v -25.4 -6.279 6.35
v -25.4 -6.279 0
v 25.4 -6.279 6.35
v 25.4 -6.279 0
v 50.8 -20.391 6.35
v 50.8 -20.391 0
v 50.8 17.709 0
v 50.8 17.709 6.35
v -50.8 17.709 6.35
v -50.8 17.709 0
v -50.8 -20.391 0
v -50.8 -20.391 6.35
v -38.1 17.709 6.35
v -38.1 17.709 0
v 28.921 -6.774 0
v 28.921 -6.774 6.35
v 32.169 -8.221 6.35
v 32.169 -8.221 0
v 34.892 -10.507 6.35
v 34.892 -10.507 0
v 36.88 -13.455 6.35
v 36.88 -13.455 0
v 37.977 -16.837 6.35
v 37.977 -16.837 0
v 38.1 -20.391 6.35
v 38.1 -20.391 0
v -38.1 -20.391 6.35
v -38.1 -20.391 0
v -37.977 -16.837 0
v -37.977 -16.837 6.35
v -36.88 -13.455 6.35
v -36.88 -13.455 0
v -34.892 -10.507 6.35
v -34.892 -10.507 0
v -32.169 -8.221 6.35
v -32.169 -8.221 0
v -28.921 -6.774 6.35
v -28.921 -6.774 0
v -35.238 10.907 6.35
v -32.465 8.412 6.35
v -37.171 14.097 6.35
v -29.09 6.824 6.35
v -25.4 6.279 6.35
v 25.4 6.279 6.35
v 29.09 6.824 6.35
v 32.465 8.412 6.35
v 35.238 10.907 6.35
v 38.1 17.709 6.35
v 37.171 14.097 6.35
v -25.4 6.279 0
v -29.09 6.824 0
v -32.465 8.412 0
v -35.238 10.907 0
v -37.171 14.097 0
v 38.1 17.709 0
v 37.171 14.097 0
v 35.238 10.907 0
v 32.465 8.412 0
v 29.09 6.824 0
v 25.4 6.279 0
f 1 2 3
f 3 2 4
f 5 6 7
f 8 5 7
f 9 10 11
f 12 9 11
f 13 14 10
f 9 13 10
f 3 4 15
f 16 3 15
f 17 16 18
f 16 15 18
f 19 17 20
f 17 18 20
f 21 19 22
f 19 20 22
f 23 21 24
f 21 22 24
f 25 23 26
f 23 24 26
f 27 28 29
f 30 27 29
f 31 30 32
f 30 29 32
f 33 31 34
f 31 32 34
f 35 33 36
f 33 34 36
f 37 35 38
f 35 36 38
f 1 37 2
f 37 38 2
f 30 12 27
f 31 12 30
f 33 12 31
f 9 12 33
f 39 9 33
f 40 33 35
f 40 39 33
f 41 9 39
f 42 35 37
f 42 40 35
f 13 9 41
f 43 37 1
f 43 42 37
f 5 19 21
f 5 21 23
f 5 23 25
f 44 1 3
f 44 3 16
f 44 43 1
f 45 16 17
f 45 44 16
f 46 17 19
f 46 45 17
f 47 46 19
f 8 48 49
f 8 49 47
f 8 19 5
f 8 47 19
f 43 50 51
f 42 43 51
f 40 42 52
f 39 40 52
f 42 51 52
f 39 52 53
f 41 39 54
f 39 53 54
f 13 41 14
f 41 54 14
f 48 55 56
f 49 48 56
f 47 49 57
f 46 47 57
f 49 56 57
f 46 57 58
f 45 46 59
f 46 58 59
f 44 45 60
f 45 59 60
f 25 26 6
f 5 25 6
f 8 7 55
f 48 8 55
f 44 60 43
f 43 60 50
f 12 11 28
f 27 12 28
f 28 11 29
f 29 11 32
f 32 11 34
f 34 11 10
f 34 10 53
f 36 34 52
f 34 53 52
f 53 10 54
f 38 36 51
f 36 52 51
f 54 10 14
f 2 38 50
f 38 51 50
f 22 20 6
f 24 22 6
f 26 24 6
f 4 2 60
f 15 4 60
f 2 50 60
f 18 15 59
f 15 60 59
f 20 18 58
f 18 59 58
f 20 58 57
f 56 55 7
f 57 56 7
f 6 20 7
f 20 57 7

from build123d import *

# Parameters (mm, degrees)
F1_DEPTH = 6.35


with BuildPart() as f1:
    # F0 (on Top) → F1 (new body)
    with BuildSketch(Plane.XY):
        with BuildLine():
            Line((0, -6.279444), (0, 0))
            Line((0, 0), (0, 6.279444))
            Line((0, 6.279444), (-25.4, 6.279444))
            ThreePointArc((-25.4, 6.279444), (-33.943051, 9.557721), (-38.1, 17.709444))
            Line((-38.1, 17.709444), (-50.8, 17.709444))
            Line((-50.8, 17.709444), (-50.8, -20.390556))
            Line((-50.8, -20.390556), (-38.1, -20.390556))
            ThreePointArc((-38.1, -20.390556), (-34.892279, -10.506949), (-25.4, -6.279444))
            Line((-25.4, -6.279444), (0, -6.279444))
        make_face()
        with BuildLine():
            Line((0, 6.279444), (0, 0))
            Line((0, 0), (0, -6.279444))
            Line((0, -6.279444), (25.4, -6.279444))
            ThreePointArc((25.4, -6.279444), (34.892279, -10.506949), (38.1, -20.390556))
            Line((38.1, -20.390556), (50.8, -20.390556))
            Line((50.8, -20.390556), (50.8, 17.709444))
            Line((50.8, 17.709444), (38.1, 17.709444))
            ThreePointArc((38.1, 17.709444), (33.943051, 9.557721), (25.4, 6.279444))
            Line((25.4, 6.279444), (0, 6.279444))
        make_face()
    extrude(amount=F1_DEPTH)


solid = f1.part
